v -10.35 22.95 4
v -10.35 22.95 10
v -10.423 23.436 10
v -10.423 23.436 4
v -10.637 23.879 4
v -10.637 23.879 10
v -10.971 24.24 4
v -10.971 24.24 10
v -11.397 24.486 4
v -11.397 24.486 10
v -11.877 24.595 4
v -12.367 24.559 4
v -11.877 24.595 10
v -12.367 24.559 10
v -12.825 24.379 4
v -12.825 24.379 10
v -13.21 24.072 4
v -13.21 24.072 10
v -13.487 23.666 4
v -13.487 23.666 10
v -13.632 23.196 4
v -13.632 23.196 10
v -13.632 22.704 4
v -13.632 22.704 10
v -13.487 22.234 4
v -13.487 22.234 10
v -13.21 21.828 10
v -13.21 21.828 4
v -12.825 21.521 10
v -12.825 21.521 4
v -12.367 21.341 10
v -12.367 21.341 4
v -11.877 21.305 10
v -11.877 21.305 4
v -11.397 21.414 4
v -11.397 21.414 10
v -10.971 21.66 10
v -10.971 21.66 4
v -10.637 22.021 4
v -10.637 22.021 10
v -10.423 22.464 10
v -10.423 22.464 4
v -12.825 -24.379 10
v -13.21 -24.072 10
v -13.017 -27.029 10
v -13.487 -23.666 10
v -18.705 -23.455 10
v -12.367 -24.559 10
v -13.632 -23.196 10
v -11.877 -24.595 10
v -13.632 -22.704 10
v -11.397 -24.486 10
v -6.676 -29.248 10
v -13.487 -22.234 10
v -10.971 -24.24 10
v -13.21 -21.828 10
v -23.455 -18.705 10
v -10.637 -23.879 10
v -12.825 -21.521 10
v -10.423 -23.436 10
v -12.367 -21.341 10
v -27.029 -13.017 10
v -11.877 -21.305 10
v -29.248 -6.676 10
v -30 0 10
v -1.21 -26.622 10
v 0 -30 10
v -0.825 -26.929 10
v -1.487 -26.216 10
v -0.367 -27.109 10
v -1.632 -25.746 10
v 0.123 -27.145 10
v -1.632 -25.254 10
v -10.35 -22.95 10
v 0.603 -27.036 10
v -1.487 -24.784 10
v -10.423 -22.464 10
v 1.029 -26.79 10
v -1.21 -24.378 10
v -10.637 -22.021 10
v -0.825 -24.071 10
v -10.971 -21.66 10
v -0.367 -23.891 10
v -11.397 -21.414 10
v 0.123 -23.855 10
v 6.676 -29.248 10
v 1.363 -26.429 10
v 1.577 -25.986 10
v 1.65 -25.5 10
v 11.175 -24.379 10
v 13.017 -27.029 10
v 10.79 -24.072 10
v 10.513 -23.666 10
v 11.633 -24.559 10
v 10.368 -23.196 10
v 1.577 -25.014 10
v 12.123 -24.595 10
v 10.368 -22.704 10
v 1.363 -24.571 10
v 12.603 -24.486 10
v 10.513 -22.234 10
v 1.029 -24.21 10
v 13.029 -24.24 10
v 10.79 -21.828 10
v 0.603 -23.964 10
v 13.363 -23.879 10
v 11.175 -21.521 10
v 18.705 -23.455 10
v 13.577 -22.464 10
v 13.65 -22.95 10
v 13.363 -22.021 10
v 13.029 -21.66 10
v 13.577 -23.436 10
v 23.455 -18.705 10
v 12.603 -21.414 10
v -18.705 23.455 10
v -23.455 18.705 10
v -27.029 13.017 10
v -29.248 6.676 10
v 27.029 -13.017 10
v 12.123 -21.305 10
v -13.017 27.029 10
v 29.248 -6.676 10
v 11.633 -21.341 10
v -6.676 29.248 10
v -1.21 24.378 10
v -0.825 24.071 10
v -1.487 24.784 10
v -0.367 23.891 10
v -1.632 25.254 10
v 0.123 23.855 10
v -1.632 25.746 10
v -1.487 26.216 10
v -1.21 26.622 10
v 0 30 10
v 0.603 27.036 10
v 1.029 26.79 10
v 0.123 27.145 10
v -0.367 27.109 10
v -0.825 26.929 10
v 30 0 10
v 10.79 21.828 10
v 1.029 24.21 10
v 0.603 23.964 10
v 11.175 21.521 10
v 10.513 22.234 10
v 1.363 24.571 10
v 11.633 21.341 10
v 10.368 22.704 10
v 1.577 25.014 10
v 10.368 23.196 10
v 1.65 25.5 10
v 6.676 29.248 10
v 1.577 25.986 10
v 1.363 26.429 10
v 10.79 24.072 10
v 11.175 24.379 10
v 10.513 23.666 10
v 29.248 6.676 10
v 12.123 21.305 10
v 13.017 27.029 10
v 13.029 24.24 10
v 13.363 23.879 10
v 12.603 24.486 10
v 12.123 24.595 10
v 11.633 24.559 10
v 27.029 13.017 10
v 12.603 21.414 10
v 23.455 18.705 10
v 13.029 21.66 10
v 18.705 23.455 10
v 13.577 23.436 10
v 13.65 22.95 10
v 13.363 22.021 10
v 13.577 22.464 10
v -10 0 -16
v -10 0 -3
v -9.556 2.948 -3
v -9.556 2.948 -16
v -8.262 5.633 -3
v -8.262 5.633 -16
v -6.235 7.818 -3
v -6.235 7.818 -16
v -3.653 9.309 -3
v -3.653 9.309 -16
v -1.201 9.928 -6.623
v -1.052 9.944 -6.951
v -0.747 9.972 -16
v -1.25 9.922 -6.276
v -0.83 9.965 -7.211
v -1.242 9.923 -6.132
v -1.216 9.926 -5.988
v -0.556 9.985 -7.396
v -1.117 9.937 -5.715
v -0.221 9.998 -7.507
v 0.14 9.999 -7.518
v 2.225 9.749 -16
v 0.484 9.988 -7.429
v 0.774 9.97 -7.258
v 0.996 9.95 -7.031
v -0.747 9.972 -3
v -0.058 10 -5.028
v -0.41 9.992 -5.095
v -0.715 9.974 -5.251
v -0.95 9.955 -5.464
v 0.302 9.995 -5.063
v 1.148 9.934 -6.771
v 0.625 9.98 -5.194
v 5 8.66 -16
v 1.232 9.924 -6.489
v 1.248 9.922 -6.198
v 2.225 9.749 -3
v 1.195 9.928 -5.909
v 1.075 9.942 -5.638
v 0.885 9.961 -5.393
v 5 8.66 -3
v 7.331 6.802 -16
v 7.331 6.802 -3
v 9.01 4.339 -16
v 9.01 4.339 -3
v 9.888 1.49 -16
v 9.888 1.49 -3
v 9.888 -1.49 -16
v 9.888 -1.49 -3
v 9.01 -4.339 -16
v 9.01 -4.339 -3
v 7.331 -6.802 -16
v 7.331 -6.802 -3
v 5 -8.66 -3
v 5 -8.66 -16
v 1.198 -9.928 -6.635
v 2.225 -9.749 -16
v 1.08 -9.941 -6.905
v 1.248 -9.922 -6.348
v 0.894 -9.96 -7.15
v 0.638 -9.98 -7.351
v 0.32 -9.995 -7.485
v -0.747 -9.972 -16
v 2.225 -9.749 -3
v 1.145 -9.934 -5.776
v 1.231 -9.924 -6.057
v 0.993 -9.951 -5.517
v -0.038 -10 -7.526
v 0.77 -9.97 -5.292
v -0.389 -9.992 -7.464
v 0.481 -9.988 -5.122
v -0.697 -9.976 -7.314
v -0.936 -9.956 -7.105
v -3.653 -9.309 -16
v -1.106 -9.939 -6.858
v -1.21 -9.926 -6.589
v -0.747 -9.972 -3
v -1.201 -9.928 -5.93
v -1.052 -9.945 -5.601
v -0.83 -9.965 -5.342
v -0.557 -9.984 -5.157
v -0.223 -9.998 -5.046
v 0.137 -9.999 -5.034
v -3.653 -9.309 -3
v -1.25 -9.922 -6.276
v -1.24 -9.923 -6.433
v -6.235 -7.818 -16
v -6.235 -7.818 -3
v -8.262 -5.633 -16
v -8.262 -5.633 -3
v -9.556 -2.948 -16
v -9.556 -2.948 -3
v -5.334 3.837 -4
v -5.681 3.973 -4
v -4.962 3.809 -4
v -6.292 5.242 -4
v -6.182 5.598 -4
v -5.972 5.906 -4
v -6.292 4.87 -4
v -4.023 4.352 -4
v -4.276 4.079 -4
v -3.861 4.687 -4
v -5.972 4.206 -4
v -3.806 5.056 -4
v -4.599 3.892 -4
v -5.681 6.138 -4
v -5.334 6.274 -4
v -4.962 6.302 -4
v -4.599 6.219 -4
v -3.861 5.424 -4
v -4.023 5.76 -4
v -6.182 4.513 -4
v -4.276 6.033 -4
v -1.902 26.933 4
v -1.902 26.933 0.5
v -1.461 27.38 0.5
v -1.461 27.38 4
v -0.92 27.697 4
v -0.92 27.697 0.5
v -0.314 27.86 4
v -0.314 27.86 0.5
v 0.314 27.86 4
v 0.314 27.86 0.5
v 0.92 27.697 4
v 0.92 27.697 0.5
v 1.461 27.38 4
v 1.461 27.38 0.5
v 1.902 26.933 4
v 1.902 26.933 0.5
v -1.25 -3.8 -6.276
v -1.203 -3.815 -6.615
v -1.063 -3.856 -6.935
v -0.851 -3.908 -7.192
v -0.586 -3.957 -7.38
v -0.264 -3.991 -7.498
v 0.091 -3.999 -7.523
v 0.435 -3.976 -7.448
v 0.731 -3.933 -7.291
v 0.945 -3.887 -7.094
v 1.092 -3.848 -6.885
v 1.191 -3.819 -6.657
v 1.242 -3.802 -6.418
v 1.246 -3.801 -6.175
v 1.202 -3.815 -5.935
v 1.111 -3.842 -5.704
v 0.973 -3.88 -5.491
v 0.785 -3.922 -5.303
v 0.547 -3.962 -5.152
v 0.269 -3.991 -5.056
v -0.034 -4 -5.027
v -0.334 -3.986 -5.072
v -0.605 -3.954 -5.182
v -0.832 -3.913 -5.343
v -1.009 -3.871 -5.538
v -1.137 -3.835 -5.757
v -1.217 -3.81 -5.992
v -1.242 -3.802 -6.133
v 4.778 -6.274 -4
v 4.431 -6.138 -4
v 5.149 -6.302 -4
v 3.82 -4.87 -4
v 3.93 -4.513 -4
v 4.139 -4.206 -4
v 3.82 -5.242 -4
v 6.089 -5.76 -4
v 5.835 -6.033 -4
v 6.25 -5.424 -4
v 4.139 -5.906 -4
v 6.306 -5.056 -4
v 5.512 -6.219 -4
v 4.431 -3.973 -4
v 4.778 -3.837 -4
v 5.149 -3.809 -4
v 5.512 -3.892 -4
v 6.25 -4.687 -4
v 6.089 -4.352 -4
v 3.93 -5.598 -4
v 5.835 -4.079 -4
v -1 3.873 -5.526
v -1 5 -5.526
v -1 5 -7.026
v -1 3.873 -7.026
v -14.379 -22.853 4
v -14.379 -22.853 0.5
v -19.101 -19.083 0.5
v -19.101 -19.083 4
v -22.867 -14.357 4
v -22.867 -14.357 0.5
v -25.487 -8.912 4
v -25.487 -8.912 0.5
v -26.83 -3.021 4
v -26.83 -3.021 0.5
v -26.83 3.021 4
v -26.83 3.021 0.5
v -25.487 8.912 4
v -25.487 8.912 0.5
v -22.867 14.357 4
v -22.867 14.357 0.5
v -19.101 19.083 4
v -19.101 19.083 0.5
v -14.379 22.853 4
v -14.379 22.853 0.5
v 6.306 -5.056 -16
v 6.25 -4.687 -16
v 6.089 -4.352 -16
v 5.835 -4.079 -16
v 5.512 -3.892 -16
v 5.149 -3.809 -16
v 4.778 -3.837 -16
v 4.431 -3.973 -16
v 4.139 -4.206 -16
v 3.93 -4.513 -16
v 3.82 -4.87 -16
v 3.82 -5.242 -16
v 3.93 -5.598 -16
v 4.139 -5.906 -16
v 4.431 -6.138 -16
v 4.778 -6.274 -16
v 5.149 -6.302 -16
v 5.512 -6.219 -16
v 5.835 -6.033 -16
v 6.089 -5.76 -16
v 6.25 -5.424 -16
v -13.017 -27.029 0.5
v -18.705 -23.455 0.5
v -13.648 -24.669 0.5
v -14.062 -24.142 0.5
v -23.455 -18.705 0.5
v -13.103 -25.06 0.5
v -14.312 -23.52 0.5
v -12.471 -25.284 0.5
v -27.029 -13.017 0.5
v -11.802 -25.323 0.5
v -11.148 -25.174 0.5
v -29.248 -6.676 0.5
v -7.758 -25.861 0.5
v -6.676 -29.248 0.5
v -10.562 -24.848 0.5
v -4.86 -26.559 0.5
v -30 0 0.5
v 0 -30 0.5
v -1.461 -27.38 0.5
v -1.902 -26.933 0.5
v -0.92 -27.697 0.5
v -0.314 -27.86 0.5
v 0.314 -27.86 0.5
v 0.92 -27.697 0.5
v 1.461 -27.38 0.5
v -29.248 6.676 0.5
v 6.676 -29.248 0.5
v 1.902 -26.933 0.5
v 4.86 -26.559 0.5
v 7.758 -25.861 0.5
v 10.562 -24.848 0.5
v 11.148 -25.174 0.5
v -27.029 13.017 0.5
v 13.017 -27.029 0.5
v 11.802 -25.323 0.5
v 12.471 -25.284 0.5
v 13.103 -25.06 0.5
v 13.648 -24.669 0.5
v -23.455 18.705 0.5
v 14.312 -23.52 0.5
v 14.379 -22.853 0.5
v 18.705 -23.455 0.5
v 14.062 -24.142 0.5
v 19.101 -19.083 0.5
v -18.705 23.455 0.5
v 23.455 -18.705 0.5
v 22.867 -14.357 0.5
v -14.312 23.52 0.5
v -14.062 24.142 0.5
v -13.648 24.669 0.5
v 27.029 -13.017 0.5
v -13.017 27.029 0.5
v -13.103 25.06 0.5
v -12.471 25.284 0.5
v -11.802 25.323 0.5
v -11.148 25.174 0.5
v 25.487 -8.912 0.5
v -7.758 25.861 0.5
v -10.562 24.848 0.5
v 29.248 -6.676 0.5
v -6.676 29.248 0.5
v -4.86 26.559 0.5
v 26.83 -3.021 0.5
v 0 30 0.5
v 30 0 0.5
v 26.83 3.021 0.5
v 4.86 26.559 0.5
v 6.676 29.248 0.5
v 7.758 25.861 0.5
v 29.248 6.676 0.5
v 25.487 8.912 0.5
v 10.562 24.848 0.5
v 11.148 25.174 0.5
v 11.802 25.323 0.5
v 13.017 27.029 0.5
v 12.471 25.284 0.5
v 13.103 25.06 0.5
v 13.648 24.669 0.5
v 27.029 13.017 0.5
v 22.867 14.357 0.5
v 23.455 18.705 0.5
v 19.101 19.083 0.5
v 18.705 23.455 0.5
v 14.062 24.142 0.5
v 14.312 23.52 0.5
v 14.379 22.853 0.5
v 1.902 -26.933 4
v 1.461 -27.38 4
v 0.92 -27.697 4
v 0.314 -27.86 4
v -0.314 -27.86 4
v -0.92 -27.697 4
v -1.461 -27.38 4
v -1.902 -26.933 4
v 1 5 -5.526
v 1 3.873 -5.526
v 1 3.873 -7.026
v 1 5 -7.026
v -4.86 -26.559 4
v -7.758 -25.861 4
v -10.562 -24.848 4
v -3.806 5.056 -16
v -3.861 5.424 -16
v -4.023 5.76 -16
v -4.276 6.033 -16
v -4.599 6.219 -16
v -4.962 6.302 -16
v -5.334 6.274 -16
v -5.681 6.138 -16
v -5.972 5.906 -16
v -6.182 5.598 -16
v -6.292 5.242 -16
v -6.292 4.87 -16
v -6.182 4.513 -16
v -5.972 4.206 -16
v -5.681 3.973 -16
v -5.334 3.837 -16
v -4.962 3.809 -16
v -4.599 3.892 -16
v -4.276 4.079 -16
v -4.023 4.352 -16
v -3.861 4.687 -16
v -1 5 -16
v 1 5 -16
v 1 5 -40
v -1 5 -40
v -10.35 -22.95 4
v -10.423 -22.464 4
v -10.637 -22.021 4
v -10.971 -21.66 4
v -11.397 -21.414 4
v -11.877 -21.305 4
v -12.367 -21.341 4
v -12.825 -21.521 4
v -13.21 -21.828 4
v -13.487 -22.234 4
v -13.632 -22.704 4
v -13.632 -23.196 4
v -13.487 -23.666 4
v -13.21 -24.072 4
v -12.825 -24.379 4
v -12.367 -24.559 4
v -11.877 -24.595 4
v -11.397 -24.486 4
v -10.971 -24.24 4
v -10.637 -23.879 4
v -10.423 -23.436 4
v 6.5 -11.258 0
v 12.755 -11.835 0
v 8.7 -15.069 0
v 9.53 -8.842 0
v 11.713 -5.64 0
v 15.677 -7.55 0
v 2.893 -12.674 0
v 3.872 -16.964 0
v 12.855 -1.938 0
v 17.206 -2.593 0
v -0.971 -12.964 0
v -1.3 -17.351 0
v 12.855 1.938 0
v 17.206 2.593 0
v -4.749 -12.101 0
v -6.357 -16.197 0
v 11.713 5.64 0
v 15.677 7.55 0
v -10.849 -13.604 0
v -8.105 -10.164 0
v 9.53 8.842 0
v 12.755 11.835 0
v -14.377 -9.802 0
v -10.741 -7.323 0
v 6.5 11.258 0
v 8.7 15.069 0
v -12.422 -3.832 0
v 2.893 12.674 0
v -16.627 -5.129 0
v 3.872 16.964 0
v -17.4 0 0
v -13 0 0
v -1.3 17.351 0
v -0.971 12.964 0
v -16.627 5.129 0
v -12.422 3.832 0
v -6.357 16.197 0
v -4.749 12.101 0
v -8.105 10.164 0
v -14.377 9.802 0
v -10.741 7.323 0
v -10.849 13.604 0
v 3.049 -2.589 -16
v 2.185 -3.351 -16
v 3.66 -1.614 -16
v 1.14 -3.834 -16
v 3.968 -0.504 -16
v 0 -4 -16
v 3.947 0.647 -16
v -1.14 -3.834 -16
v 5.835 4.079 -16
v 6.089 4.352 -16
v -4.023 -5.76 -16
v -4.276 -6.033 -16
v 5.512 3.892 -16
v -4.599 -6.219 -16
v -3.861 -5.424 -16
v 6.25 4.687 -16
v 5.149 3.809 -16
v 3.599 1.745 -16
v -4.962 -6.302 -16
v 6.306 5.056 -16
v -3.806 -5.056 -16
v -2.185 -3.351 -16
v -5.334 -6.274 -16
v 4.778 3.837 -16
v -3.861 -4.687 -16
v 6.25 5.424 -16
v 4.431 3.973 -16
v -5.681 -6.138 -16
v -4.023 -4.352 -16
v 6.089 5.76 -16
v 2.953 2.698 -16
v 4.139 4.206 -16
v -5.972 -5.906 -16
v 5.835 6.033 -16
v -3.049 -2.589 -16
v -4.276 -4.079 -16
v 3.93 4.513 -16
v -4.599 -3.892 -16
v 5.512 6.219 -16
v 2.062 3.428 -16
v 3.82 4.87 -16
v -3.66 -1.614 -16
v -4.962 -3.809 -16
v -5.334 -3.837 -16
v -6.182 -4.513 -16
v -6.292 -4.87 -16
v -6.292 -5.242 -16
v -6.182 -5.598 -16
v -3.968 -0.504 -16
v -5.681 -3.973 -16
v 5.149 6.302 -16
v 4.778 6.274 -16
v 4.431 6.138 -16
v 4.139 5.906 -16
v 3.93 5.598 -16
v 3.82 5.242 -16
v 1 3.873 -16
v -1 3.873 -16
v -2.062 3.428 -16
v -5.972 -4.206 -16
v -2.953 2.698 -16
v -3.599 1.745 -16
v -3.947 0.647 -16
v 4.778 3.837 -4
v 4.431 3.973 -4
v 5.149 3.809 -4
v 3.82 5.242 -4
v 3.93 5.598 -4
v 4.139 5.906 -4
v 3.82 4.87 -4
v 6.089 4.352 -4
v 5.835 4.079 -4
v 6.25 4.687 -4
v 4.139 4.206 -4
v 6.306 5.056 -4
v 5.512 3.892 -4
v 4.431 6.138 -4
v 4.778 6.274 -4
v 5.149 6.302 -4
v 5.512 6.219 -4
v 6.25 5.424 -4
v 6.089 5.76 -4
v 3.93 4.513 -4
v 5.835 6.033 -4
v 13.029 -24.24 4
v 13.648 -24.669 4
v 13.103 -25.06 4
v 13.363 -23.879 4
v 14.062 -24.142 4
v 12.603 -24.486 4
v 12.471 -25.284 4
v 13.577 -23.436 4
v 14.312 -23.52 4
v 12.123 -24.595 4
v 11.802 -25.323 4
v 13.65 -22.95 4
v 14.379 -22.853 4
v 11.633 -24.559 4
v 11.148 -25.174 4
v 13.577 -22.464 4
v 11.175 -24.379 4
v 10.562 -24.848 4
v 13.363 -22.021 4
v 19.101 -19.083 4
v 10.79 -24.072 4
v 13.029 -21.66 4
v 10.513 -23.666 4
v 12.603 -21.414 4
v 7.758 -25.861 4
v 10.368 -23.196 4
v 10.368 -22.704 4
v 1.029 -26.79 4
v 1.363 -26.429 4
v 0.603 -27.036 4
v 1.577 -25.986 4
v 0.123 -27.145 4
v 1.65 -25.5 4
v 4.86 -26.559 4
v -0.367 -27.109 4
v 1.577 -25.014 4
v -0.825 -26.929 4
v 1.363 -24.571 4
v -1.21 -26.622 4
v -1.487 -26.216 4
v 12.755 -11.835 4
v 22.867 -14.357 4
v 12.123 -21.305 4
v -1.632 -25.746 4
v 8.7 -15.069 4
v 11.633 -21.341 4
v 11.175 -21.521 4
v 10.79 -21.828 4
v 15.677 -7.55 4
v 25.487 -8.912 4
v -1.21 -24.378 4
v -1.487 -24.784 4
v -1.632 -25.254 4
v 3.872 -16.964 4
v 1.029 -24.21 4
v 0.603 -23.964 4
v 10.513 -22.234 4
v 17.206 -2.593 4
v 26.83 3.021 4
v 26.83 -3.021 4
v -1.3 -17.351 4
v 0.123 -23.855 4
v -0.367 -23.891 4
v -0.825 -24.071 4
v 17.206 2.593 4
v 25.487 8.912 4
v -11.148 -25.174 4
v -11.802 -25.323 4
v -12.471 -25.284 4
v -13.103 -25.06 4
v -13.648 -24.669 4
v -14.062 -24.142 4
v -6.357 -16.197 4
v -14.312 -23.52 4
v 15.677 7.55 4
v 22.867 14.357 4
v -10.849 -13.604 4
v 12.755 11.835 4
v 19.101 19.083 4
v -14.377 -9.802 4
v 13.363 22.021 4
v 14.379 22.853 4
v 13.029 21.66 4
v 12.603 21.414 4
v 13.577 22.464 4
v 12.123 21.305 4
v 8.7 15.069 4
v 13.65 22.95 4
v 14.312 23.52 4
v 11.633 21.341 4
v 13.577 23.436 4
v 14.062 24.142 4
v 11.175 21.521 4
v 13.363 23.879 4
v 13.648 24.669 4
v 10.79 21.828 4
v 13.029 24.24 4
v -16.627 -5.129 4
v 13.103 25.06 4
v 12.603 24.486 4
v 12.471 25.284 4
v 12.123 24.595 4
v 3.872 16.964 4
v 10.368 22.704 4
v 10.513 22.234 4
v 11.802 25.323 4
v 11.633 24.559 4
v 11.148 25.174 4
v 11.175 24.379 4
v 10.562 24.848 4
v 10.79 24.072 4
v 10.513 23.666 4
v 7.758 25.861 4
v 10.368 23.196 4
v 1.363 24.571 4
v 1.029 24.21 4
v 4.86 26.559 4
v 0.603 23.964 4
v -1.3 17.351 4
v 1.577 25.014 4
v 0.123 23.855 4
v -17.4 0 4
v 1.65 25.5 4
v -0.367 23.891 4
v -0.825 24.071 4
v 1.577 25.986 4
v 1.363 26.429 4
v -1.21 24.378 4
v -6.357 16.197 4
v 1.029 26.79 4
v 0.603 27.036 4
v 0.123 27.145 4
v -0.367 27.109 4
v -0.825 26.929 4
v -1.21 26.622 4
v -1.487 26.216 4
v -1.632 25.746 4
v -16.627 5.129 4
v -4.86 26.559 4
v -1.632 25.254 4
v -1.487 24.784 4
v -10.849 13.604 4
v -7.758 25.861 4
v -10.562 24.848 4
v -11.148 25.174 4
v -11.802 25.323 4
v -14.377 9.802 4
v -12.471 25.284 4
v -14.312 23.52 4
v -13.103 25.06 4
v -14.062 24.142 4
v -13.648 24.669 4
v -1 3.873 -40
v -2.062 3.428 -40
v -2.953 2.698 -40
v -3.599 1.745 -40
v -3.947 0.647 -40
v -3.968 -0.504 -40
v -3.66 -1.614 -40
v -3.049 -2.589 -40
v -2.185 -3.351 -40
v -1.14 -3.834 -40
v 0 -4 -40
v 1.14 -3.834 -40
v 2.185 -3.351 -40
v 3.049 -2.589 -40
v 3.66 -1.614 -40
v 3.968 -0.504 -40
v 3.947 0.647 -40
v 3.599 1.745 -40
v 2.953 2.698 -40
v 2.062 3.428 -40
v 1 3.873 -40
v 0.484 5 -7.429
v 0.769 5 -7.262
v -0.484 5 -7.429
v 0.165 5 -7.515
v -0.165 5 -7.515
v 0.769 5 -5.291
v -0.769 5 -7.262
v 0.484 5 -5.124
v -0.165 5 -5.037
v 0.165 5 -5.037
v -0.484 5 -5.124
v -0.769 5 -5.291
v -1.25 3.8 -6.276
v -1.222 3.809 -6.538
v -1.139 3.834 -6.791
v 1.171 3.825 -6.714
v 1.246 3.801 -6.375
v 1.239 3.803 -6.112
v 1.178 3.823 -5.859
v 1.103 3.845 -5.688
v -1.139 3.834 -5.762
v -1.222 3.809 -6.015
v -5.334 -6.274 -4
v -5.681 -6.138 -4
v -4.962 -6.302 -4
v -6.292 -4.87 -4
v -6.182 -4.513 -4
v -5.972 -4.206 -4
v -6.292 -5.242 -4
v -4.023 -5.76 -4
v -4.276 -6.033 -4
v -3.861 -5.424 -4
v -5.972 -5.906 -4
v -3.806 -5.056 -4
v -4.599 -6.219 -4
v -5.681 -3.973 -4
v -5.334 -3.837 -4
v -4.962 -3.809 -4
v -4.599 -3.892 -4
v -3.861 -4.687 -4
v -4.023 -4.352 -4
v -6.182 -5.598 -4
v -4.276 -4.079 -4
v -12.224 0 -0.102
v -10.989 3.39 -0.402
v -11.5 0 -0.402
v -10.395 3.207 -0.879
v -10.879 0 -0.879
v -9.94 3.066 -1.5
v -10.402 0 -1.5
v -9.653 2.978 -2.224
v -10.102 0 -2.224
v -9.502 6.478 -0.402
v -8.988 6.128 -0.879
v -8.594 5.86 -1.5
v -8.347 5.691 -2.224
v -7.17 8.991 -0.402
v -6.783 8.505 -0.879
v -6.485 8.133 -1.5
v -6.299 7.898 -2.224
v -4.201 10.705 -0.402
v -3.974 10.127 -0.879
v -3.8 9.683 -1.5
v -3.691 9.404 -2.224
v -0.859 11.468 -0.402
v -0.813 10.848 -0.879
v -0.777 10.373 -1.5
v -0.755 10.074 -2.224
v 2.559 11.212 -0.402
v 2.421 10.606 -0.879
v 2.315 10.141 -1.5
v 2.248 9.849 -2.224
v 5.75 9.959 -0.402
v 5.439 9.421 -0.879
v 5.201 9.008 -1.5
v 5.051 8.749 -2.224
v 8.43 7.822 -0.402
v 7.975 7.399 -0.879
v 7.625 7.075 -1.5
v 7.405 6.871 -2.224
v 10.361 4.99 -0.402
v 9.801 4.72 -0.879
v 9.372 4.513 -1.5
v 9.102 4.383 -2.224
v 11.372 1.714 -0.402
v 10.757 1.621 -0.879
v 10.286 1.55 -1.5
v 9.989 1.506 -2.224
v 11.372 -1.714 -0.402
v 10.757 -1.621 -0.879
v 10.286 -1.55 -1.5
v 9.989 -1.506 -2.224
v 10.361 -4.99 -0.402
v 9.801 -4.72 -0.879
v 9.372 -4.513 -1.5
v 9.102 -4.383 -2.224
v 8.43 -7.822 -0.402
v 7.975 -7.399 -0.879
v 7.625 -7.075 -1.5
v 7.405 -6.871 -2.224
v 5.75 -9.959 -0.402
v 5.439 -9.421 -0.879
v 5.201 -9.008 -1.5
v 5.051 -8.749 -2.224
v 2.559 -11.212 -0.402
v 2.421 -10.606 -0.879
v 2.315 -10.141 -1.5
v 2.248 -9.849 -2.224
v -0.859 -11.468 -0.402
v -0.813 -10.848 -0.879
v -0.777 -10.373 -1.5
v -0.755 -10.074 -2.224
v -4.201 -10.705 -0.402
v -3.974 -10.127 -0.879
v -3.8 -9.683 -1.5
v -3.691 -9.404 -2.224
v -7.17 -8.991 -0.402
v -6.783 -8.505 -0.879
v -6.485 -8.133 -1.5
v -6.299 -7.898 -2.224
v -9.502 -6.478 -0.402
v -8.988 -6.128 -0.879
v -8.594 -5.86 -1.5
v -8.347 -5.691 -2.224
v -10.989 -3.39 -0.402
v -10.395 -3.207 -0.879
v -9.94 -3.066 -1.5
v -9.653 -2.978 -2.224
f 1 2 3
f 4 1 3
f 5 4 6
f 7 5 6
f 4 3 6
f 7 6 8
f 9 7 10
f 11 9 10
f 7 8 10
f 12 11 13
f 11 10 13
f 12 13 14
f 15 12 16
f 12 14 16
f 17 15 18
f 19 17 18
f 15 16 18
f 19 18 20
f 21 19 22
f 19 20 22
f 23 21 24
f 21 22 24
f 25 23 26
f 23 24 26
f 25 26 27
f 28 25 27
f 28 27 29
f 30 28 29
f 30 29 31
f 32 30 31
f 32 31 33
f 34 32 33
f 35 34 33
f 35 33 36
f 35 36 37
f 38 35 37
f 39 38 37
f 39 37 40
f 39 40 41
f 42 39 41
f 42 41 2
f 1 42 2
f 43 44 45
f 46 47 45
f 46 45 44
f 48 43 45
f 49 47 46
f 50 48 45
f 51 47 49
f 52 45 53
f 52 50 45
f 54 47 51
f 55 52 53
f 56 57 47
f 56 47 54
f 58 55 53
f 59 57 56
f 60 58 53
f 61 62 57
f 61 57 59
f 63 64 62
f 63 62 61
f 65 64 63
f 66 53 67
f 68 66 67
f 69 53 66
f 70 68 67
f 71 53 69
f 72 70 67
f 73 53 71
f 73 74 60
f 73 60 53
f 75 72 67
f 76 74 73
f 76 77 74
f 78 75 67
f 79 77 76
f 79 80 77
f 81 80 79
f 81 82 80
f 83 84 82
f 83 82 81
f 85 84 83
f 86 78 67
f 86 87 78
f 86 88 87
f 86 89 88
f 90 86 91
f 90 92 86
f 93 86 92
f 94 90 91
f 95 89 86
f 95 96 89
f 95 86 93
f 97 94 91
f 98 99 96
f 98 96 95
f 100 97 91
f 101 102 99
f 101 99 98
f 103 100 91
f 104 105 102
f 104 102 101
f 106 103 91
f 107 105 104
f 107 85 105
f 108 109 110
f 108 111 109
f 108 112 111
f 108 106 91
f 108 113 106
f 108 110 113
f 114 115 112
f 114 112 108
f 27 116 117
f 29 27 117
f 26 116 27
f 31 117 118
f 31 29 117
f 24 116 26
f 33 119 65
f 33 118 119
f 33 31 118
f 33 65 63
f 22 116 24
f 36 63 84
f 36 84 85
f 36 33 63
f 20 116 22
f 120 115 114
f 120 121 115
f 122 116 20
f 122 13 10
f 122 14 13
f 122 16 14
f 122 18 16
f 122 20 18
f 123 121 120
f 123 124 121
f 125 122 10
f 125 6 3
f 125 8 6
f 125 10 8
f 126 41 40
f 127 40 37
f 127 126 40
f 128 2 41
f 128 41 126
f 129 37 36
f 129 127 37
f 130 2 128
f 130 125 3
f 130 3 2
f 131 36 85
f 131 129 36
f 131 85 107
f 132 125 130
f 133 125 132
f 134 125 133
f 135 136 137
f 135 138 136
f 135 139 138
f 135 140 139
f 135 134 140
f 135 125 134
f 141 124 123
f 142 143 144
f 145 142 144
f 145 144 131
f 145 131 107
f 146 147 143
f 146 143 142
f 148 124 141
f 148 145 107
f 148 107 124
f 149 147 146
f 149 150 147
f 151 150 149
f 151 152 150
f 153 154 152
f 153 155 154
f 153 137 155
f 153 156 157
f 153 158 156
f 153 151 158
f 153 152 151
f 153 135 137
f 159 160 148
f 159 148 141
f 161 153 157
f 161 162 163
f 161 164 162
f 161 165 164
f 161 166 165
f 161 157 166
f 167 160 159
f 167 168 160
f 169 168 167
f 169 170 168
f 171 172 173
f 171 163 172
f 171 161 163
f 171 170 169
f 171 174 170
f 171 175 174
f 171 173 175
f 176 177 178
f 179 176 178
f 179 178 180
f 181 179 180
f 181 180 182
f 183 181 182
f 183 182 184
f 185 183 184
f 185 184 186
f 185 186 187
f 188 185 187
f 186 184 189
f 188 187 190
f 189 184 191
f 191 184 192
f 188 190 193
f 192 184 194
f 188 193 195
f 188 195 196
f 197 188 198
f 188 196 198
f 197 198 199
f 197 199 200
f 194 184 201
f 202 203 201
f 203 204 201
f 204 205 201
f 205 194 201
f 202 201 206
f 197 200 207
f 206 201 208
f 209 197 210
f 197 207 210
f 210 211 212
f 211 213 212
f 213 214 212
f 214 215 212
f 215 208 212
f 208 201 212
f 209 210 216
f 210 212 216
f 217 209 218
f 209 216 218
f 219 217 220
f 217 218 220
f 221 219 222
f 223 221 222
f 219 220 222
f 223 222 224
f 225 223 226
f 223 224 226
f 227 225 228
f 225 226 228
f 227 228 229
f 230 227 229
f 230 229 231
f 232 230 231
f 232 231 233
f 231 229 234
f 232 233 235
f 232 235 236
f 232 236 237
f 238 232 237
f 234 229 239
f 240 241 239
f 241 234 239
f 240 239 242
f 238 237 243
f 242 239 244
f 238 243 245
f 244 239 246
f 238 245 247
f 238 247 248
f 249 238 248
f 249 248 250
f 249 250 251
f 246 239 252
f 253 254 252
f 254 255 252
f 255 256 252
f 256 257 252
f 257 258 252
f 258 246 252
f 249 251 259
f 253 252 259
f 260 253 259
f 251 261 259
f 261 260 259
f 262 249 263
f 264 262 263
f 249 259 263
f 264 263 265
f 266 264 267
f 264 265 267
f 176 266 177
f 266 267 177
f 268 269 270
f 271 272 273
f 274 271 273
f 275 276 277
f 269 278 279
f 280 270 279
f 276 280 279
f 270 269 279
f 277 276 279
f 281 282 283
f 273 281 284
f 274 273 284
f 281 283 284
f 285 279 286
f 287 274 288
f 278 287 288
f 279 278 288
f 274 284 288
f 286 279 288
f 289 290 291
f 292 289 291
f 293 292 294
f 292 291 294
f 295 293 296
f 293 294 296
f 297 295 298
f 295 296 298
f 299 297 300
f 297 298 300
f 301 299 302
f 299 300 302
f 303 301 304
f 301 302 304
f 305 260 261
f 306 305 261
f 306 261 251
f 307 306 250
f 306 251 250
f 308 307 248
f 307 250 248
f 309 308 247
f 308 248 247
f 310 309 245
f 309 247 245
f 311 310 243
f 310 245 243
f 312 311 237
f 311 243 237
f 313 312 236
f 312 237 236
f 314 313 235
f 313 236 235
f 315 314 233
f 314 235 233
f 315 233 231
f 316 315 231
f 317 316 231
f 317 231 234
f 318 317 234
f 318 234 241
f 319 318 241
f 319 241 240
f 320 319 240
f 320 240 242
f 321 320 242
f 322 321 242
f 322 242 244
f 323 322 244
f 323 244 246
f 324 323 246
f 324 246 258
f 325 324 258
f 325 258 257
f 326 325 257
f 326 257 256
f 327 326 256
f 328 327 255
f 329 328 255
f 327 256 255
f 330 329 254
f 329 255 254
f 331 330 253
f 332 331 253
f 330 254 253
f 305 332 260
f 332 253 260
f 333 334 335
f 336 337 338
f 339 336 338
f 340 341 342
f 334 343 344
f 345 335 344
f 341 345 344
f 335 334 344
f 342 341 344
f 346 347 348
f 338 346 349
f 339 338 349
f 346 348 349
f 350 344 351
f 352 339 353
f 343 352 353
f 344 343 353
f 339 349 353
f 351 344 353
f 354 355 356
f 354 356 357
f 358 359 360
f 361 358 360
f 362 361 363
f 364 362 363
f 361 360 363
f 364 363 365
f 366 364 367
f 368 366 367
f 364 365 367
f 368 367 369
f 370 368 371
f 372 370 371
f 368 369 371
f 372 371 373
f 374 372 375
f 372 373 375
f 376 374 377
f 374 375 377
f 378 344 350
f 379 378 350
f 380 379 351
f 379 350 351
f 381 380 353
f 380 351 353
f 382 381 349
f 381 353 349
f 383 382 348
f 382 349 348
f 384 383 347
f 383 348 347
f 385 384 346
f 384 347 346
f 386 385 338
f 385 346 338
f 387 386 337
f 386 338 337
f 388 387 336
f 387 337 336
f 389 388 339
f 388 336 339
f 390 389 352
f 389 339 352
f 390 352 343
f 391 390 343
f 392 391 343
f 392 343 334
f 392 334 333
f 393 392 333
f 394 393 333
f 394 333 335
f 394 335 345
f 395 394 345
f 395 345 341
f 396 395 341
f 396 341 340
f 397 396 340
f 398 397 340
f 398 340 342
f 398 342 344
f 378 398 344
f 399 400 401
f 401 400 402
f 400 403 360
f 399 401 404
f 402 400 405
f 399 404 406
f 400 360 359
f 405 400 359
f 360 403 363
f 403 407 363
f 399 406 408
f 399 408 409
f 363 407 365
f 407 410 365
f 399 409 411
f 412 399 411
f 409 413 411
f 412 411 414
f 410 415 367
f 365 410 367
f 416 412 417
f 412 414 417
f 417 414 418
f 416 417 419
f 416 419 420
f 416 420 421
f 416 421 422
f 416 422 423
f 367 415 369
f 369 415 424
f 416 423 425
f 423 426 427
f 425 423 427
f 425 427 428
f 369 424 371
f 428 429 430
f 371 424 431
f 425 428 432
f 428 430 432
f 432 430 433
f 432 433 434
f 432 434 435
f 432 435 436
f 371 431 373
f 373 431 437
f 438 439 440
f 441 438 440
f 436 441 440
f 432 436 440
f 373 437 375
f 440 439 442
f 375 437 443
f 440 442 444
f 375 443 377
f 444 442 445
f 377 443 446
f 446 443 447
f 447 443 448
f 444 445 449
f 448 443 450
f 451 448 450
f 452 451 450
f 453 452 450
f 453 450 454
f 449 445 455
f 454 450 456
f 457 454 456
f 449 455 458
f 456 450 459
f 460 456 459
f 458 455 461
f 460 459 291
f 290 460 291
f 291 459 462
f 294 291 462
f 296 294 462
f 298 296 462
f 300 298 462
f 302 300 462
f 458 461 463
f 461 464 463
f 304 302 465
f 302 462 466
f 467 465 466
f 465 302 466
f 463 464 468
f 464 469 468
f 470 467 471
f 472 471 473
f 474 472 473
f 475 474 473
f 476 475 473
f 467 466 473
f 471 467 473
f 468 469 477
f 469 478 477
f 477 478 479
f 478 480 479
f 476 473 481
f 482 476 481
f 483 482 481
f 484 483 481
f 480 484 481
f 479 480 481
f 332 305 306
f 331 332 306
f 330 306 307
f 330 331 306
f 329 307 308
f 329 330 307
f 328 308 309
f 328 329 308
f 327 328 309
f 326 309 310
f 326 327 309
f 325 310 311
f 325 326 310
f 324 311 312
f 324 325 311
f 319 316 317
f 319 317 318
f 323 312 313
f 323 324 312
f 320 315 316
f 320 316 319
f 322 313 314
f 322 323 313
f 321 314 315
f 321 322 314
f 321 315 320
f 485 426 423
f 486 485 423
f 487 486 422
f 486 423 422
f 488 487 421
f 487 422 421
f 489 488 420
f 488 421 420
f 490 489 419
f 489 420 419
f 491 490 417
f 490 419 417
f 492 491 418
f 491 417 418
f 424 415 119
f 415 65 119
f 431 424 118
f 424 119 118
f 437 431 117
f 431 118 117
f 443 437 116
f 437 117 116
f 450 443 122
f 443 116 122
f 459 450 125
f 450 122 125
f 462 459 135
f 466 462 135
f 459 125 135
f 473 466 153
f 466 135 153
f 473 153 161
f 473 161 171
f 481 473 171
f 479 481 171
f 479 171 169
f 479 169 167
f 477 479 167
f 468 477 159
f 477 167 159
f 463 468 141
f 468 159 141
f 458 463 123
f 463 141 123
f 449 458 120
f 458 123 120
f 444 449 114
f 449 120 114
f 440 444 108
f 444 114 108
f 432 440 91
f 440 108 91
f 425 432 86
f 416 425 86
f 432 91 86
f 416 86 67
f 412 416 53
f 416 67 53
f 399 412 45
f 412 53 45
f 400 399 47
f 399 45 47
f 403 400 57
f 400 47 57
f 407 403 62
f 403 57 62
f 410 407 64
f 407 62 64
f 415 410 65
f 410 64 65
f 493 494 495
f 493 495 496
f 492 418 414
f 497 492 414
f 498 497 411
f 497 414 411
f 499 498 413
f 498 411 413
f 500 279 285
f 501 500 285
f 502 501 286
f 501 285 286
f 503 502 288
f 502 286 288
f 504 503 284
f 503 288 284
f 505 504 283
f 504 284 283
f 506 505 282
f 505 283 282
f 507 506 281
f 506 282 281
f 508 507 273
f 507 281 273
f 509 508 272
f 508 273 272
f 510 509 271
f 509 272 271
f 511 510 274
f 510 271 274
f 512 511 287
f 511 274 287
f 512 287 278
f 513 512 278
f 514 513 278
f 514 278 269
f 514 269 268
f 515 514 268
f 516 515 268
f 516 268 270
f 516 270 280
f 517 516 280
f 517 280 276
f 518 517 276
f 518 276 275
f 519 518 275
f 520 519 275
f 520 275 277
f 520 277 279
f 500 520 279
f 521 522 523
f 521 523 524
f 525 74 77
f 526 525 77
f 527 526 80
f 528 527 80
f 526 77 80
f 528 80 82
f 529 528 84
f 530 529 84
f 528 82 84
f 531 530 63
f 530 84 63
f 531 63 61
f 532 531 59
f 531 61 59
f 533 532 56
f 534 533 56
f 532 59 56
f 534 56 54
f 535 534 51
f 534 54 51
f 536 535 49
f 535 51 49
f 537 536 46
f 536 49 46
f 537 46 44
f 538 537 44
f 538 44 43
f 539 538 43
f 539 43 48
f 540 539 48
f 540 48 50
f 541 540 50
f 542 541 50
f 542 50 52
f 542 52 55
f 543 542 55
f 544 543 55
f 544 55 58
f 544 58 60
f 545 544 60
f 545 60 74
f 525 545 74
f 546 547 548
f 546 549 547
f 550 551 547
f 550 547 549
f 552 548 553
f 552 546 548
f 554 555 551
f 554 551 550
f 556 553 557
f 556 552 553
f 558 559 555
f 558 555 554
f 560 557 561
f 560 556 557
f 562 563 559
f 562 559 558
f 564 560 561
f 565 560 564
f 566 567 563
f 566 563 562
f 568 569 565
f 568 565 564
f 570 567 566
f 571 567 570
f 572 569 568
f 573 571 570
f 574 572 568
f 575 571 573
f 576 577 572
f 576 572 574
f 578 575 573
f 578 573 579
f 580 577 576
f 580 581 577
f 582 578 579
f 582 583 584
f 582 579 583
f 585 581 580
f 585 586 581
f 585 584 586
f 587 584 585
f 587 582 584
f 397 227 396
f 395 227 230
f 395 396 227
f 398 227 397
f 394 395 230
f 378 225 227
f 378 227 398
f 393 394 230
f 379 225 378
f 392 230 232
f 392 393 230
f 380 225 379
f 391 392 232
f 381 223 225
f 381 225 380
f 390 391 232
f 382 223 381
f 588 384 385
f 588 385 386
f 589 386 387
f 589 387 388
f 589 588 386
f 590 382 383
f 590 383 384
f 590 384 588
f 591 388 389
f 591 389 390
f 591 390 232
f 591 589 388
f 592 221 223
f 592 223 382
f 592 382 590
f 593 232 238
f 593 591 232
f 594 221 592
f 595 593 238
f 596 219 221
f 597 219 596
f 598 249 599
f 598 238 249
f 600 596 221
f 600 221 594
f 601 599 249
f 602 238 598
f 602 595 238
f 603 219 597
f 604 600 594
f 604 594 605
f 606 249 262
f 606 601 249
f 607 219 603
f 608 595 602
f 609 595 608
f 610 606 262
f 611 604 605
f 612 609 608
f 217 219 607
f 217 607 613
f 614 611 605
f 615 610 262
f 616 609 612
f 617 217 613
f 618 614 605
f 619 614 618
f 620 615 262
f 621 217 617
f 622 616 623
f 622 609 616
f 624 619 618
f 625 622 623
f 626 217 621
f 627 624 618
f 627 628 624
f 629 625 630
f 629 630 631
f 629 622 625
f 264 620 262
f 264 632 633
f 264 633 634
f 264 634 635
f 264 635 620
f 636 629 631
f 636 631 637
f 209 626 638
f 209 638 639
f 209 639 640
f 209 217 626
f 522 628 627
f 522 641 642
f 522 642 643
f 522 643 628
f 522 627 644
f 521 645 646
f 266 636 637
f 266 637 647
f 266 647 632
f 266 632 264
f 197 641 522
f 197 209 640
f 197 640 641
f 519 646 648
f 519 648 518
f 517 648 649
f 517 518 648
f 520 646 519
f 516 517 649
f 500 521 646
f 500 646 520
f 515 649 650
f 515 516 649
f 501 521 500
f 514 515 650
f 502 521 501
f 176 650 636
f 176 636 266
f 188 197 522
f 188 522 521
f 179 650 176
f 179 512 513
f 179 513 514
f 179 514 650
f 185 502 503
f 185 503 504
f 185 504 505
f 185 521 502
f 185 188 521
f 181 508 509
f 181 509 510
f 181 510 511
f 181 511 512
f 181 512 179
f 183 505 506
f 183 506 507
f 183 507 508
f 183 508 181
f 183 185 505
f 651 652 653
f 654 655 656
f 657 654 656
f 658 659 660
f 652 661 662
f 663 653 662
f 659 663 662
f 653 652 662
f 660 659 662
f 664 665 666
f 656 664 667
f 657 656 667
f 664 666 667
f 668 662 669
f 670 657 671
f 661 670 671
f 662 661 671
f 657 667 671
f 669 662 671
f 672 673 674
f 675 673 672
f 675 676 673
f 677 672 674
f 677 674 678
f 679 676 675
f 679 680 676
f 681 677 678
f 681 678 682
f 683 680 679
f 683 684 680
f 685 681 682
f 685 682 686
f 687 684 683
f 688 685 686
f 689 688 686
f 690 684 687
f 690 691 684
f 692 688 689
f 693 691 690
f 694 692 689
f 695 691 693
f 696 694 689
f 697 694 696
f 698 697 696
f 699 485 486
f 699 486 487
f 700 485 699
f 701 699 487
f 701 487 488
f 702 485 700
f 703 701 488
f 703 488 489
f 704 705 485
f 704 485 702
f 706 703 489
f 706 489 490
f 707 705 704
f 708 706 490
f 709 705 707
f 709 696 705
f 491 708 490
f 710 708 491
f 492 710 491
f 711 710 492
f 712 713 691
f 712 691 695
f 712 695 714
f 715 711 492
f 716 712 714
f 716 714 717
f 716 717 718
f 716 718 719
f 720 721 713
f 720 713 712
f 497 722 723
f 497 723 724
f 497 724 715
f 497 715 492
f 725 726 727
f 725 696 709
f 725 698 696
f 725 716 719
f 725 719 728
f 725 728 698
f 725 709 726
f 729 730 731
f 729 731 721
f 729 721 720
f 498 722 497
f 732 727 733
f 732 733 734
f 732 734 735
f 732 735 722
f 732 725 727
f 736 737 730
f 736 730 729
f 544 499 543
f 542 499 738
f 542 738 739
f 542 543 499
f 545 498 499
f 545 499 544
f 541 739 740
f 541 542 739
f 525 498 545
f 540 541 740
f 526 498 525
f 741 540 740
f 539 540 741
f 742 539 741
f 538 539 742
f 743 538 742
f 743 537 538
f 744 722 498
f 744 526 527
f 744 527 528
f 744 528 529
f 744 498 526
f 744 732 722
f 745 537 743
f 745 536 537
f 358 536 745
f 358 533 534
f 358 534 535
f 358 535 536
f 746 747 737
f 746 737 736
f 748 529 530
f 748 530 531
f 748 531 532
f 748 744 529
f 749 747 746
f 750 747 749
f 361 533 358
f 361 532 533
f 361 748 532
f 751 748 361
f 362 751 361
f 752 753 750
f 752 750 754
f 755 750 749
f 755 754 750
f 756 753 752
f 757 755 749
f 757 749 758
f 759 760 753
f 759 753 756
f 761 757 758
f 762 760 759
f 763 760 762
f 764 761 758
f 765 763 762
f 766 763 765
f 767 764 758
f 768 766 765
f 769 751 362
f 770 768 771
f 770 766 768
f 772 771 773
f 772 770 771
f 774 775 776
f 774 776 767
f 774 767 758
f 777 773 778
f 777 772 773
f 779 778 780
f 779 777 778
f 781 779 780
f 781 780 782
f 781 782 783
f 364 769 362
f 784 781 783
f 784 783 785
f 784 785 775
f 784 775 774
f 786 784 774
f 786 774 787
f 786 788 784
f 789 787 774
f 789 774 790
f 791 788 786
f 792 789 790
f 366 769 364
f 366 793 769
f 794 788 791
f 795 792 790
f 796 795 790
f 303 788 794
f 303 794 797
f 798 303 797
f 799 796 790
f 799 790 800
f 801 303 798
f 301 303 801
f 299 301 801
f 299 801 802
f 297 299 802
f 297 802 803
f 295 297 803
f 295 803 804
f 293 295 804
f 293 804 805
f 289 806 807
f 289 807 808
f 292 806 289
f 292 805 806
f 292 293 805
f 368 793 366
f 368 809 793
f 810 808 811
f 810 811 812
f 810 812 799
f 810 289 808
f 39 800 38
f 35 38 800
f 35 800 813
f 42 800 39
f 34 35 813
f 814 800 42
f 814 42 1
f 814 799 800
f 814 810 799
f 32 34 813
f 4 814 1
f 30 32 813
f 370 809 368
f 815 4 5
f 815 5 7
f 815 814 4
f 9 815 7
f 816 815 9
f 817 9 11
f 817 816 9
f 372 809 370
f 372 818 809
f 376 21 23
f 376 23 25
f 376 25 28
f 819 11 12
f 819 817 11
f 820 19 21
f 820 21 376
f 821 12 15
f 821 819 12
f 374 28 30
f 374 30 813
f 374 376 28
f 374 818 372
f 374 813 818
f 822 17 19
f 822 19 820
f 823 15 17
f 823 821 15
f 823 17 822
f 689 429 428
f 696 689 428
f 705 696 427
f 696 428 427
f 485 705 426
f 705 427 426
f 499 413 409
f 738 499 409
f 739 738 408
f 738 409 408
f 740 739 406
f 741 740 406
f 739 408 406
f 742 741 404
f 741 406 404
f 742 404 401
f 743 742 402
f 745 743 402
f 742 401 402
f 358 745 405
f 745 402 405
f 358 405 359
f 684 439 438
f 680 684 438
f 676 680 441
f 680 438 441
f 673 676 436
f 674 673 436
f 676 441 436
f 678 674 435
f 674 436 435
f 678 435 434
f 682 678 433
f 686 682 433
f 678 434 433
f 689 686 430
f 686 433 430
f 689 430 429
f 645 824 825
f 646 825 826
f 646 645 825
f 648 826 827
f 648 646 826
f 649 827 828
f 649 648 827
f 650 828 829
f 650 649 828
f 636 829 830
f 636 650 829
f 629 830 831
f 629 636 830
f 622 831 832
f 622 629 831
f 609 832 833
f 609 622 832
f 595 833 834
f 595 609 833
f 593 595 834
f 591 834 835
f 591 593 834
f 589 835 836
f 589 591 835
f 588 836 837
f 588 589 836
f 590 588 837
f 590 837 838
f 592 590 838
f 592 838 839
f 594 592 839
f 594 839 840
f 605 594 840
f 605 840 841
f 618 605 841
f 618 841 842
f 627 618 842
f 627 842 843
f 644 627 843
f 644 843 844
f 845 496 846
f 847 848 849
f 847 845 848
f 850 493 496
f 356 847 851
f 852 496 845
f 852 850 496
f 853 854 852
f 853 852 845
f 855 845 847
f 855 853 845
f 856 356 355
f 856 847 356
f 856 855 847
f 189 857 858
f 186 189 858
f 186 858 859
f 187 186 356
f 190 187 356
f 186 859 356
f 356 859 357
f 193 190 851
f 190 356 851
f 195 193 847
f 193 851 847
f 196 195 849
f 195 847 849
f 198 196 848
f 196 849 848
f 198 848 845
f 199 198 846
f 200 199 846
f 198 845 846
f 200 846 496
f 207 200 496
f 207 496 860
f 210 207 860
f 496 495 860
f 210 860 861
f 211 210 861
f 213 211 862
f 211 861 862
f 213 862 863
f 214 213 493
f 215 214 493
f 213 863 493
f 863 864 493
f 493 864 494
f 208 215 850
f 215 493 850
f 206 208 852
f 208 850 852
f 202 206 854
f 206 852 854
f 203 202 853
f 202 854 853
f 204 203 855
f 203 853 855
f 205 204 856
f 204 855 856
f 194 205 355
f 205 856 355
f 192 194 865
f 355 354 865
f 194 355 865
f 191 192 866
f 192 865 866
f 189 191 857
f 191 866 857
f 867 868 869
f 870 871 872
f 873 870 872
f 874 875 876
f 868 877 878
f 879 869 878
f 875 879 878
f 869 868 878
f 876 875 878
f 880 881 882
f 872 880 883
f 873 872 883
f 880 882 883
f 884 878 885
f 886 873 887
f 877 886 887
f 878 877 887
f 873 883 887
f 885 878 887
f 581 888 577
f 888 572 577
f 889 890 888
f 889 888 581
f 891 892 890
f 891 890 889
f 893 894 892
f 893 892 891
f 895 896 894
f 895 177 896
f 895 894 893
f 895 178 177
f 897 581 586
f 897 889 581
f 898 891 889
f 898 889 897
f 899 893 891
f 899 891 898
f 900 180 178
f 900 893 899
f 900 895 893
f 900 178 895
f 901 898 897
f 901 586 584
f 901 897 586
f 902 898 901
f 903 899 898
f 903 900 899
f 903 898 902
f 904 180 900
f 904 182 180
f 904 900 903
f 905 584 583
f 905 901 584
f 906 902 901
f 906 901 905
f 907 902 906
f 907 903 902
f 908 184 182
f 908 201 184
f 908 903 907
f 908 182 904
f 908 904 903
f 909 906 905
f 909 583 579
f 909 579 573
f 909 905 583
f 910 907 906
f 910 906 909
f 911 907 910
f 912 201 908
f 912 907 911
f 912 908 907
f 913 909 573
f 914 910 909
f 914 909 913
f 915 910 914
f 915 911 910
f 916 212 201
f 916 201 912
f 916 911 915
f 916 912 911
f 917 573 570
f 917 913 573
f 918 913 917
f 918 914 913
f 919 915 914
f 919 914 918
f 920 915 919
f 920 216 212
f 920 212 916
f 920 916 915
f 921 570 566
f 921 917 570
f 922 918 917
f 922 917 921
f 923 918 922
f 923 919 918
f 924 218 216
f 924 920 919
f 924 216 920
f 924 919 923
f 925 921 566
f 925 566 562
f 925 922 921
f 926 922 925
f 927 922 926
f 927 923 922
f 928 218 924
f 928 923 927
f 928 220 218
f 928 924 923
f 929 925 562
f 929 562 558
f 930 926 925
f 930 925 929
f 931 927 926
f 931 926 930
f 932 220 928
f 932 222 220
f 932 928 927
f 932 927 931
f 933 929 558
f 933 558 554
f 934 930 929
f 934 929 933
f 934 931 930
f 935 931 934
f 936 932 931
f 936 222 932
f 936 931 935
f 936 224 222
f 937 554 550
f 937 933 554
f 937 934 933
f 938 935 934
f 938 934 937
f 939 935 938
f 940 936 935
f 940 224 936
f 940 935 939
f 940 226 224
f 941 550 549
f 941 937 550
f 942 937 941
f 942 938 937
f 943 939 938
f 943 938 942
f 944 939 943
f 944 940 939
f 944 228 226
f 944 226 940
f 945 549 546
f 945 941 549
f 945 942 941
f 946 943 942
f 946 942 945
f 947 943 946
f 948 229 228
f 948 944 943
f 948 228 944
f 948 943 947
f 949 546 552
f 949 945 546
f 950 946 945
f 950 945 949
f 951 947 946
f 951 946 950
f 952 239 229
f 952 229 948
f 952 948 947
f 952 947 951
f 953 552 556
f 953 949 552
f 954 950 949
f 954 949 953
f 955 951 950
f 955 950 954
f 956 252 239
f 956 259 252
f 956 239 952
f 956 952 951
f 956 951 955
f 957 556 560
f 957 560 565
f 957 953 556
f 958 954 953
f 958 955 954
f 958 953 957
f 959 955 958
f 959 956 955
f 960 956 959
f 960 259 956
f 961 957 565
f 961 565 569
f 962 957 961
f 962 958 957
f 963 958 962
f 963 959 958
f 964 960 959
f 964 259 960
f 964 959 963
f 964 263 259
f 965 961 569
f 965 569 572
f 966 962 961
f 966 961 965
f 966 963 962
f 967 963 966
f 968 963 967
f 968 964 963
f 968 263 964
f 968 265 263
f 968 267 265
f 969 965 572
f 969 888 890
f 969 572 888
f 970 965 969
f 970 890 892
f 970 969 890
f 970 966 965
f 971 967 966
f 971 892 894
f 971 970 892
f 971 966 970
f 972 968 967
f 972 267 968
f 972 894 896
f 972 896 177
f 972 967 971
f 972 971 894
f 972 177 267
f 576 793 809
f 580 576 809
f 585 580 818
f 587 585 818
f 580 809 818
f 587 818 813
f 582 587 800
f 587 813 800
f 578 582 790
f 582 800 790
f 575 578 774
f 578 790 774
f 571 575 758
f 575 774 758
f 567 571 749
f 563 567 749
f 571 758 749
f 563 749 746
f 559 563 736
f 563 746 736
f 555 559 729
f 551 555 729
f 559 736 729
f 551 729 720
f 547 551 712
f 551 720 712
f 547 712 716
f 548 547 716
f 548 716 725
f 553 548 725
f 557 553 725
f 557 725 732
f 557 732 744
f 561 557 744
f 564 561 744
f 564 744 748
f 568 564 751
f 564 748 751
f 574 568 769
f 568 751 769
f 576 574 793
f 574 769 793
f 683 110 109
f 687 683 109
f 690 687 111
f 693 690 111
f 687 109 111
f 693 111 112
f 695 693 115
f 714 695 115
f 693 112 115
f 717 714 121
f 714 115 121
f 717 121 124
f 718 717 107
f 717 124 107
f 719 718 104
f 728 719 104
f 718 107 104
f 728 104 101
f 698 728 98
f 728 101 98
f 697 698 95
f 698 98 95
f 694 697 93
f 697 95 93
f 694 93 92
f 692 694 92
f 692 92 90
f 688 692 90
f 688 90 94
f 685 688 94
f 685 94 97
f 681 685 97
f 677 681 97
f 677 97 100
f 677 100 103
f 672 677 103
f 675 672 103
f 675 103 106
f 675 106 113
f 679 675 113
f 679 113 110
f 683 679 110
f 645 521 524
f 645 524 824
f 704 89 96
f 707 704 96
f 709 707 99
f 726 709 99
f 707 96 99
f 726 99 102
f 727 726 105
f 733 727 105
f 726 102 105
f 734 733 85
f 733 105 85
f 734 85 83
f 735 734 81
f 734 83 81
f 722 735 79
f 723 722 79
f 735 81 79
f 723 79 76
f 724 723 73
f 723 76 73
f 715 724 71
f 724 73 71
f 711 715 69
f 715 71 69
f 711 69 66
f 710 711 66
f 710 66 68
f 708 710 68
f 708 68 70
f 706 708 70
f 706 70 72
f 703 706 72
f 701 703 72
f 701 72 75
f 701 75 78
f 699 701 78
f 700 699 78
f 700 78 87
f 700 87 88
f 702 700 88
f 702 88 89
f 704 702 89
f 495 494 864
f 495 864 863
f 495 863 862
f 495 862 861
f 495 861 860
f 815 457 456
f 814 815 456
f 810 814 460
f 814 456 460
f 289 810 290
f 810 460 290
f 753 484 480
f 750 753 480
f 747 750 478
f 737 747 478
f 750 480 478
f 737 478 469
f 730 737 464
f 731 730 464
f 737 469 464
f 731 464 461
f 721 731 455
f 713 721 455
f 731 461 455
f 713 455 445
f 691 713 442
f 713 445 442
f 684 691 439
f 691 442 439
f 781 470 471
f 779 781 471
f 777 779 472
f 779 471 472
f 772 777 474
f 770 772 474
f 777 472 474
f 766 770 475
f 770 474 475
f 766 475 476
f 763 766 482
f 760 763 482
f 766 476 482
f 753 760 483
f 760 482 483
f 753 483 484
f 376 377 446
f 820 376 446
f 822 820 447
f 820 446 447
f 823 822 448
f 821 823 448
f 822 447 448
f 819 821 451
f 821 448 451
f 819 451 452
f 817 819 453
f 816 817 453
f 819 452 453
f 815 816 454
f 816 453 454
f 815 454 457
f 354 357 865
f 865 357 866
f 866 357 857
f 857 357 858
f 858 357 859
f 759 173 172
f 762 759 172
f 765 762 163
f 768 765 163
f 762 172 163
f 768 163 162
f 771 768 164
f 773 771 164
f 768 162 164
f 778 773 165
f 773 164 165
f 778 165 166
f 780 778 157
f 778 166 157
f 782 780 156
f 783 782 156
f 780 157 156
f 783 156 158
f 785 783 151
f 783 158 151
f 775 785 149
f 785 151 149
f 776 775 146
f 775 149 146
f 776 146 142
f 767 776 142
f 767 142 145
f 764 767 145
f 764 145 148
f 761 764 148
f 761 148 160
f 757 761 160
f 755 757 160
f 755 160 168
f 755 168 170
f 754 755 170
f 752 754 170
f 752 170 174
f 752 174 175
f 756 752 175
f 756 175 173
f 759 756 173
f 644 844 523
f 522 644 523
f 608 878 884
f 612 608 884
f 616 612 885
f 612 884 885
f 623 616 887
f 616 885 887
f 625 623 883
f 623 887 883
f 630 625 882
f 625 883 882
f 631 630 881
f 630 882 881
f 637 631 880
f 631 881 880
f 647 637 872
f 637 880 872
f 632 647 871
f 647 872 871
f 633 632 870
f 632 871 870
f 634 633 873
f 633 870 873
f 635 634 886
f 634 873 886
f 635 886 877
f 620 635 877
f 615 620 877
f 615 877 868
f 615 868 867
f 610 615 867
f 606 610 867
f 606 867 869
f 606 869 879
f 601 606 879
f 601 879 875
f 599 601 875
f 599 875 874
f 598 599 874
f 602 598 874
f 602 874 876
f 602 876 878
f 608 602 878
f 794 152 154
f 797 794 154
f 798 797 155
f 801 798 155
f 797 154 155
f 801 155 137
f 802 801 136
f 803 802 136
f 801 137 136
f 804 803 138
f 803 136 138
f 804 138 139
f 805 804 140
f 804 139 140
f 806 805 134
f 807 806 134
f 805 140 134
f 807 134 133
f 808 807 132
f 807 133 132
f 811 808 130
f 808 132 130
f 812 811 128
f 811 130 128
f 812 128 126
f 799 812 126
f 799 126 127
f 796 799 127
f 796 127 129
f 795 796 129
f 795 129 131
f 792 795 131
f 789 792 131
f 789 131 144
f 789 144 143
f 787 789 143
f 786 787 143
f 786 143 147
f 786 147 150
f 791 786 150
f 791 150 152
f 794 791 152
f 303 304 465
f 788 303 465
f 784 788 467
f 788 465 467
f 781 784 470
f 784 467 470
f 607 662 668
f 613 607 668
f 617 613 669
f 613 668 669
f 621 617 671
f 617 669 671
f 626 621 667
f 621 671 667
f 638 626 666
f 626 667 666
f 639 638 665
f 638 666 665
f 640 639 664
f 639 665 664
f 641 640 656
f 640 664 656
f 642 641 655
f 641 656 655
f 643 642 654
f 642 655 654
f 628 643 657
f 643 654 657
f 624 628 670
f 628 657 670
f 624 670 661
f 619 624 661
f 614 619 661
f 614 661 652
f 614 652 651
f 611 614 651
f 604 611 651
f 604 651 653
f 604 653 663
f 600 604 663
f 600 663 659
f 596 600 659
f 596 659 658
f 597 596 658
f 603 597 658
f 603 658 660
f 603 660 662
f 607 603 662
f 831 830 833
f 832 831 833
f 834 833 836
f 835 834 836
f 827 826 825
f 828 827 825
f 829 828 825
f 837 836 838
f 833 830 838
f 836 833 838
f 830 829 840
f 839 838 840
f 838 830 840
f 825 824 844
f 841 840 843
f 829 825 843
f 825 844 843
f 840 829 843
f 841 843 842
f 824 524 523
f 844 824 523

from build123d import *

# Parameters (mm, degrees)
SKETCH1_W                  = 30
SKETCH1_H                  = 9.5
CUT_EXTRUDE1_DEPTH         = 3.5
SKETCH3_R                  = 17.4
BOSS_EXTRUDE1_DEPTH        = 4
SKETCH4_R                  = 10
BOSS_EXTRUDE2_DEPTH        = 16
CUT_EXTRUDE2_DEPTH         = 50.759421218
SKETCH6_W                  = 4
SKETCH6_H                  = 26
F_4_CLEARANCE_HOLE1_D      = 3.3
F_2_CLEARANCE_HOLE1_D      = 2.5
F_2_CLEARANCE_HOLE1_DEPTH  = 12
F_2_CLEARANCE_HOLE2_REACH  = 54.582
F_2_CLEARANCE_HOLE2_BORE_R = 1.25
F_2_CLEARANCE_HOLE3_D      = 2.5
F_2_CLEARANCE_HOLE3_DEPTH  = 40
FILLET1_R                  = 3
EXTRUDE_1_DEPTH            = 50


with BuildPart() as part:
    # Sketch1 → Revolve1 (revolve)
    with BuildSketch(Plane.XZ, mode=Mode.PRIVATE) as revolve1_sk:
        with Locations((15, 5.25)):
            Rectangle(SKETCH1_W, SKETCH1_H)
    revolve(revolve1_sk.sketch.rotate(Axis((0, 0, 10), (0, 0, -1)), 180), axis=Axis((0, 0, 10), (0, 0, -1)))

    # Sketch2 → Cut-Extrude1 (cut)
    with BuildSketch(Plane(origin=(0, 0, 0.5), x_dir=(-1, 0, 0), z_dir=(0, 0, -1))):
        with BuildLine():
            ThreePointArc((1.901854596, -26.932934283), (6.318658968, -26.250229501), (10.562335147, -24.848281153))
            ThreePointArc((10.562335147, -24.848281153), (13.103370267, -25.060195635), (14.379253383, -22.852506912))
            ThreePointArc((14.379253383, -22.852506912), (27, 0), (14.379253383, 22.852506912))
            ThreePointArc((14.379253383, 22.852506912), (13.103370267, 25.060195635), (10.562335147, 24.848281153))
            ThreePointArc((10.562335147, 24.848281153), (6.318658968, 26.250229501), (1.901854596, 26.932934283))
            ThreePointArc((1.901854596, 26.932934283), (0, 27.88125), (-1.901854596, 26.932934283))
            ThreePointArc((-1.901854596, 26.932934283), (-6.318658968, 26.250229501), (-10.562335147, 24.848281153))
            ThreePointArc((-10.562335147, 24.848281153), (-13.103370267, 25.060195635), (-14.379253383, 22.852506912))
            ThreePointArc((-14.379253383, 22.852506912), (-27, 0), (-14.379253383, -22.852506912))
            ThreePointArc((-14.379253383, -22.852506912), (-13.103370267, -25.060195635), (-10.562335147, -24.848281153))
            ThreePointArc((-10.562335147, -24.848281153), (-6.318658968, -26.250229501), (-1.901854596, -26.932934283))
            ThreePointArc((-1.901854596, -26.932934283), (0, -27.88125), (1.901854596, -26.932934283))
        make_face()
    extrude(amount=-CUT_EXTRUDE1_DEPTH, mode=Mode.SUBTRACT)

    # Sketch3 → Boss-Extrude1 (add)
    with BuildSketch(Plane(origin=(0, 0, 4), x_dir=(-1, 0, 0), z_dir=(0, 0, -1))):
        Circle(SKETCH3_R)
    extrude(amount=BOSS_EXTRUDE1_DEPTH)

    # Sketch4 → Boss-Extrude2 (add)
    with BuildSketch(Plane(origin=(0, 0, 0), x_dir=(-1, 0, 0), z_dir=(0, 0, -1))):
        Circle(SKETCH4_R)
    extrude(amount=BOSS_EXTRUDE2_DEPTH)

    # Sketch5 → Cut-Extrude2 (cut, through all)
    with BuildSketch(Plane.XY.offset(10)):
        with BuildLine():
            Line((1, 5), (-1, 5))
            Line((-1, 5), (-1, 3.872983346))
            ThreePointArc((-1, 3.872983346), (0, 4), (1, 3.872983346))
            Line((1, 3.872983346), (1, 5))
        make_face()
    extrude(amount=-CUT_EXTRUDE2_DEPTH, mode=Mode.SUBTRACT)

    # Sketch6 → Cut-Revolve1 (revolve, cut)
    with BuildSketch(Plane.XZ):
        with Locations((2, -3)):
            Rectangle(SKETCH6_W, SKETCH6_H)
    revolve(axis=Axis((0, 0, 10), (0, 0, -1)), mode=Mode.SUBTRACT)

    # #4 Clearance Hole1 (through all)
    with Locations(Plane(origin=(0, 0, 4), x_dir=(-1, 0, 0), z_dir=(0, 0, -1))):
        with Locations((12, -22.95), (0, -25.5), (-12, -22.95), (-12, 22.95), (0, 25.5), (12, 22.95)):
            Hole(F_4_CLEARANCE_HOLE1_D / 2)

    # #2 Clearance Hole1
    with Locations(Plane(origin=(0, 0, -16), x_dir=(-1, 0, 0), z_dir=(0, 0, -1))):
        with Locations((-5.055813485, -5.055813485), (5.055813485, -5.055813485), (5.055813485, 5.055813485), (-5.055813485, 5.055813485)):
            Hole(F_2_CLEARANCE_HOLE1_D / 2, depth=F_2_CLEARANCE_HOLE1_DEPTH)

    # #2 Clearance Hole2 bore (on position points) → #2 Clearance Hole2 (cut, up to next)
    with BuildSketch(Plane(origin=(0, -10, -6.276306458), x_dir=(-1, 0, 0), z_dir=(0, -1, 0)), mode=Mode.PRIVATE) as f_2_clearance_hole2_sk1:
        Circle(F_2_CLEARANCE_HOLE2_BORE_R)
    f_2_clearance_hole2_tool1 = extrude(f_2_clearance_hole2_sk1.sketch, amount=-F_2_CLEARANCE_HOLE2_REACH, mode=Mode.PRIVATE) & part.part
    add(f_2_clearance_hole2_tool1.solids().sort_by_distance((0, -10, -6.276306))[0], mode=Mode.SUBTRACT)

    # #2 Clearance Hole3
    with Locations(Plane(origin=(0, 10, -6.276306458), x_dir=(1, 0, 0), z_dir=(0, 1, 0))):
        with Locations((0, 0)):
            Hole(F_2_CLEARANCE_HOLE3_D / 2, depth=F_2_CLEARANCE_HOLE3_DEPTH)

    # Fillet1
    fillet1_edges = [part.edges().sort_by_distance(p)[0] for p in [
        (10, 0, 0),
    ]]
    fillet(fillet1_edges, radius=FILLET1_R)

    # 草图1 → 凸台-拉伸1 (add)
    with BuildSketch(Plane.XY.offset(10)):
        with BuildLine():
            Line((-1, 5), (-1, 3.872983346))
            ThreePointArc((-1, 3.872983346), (0, -4), (1, 3.872983346))
            Line((1, 3.872983346), (1, 5))
            Line((1, 5), (-1, 5))
        make_face()
    extrude(amount=-EXTRUDE_1_DEPTH)


solid = part.part
